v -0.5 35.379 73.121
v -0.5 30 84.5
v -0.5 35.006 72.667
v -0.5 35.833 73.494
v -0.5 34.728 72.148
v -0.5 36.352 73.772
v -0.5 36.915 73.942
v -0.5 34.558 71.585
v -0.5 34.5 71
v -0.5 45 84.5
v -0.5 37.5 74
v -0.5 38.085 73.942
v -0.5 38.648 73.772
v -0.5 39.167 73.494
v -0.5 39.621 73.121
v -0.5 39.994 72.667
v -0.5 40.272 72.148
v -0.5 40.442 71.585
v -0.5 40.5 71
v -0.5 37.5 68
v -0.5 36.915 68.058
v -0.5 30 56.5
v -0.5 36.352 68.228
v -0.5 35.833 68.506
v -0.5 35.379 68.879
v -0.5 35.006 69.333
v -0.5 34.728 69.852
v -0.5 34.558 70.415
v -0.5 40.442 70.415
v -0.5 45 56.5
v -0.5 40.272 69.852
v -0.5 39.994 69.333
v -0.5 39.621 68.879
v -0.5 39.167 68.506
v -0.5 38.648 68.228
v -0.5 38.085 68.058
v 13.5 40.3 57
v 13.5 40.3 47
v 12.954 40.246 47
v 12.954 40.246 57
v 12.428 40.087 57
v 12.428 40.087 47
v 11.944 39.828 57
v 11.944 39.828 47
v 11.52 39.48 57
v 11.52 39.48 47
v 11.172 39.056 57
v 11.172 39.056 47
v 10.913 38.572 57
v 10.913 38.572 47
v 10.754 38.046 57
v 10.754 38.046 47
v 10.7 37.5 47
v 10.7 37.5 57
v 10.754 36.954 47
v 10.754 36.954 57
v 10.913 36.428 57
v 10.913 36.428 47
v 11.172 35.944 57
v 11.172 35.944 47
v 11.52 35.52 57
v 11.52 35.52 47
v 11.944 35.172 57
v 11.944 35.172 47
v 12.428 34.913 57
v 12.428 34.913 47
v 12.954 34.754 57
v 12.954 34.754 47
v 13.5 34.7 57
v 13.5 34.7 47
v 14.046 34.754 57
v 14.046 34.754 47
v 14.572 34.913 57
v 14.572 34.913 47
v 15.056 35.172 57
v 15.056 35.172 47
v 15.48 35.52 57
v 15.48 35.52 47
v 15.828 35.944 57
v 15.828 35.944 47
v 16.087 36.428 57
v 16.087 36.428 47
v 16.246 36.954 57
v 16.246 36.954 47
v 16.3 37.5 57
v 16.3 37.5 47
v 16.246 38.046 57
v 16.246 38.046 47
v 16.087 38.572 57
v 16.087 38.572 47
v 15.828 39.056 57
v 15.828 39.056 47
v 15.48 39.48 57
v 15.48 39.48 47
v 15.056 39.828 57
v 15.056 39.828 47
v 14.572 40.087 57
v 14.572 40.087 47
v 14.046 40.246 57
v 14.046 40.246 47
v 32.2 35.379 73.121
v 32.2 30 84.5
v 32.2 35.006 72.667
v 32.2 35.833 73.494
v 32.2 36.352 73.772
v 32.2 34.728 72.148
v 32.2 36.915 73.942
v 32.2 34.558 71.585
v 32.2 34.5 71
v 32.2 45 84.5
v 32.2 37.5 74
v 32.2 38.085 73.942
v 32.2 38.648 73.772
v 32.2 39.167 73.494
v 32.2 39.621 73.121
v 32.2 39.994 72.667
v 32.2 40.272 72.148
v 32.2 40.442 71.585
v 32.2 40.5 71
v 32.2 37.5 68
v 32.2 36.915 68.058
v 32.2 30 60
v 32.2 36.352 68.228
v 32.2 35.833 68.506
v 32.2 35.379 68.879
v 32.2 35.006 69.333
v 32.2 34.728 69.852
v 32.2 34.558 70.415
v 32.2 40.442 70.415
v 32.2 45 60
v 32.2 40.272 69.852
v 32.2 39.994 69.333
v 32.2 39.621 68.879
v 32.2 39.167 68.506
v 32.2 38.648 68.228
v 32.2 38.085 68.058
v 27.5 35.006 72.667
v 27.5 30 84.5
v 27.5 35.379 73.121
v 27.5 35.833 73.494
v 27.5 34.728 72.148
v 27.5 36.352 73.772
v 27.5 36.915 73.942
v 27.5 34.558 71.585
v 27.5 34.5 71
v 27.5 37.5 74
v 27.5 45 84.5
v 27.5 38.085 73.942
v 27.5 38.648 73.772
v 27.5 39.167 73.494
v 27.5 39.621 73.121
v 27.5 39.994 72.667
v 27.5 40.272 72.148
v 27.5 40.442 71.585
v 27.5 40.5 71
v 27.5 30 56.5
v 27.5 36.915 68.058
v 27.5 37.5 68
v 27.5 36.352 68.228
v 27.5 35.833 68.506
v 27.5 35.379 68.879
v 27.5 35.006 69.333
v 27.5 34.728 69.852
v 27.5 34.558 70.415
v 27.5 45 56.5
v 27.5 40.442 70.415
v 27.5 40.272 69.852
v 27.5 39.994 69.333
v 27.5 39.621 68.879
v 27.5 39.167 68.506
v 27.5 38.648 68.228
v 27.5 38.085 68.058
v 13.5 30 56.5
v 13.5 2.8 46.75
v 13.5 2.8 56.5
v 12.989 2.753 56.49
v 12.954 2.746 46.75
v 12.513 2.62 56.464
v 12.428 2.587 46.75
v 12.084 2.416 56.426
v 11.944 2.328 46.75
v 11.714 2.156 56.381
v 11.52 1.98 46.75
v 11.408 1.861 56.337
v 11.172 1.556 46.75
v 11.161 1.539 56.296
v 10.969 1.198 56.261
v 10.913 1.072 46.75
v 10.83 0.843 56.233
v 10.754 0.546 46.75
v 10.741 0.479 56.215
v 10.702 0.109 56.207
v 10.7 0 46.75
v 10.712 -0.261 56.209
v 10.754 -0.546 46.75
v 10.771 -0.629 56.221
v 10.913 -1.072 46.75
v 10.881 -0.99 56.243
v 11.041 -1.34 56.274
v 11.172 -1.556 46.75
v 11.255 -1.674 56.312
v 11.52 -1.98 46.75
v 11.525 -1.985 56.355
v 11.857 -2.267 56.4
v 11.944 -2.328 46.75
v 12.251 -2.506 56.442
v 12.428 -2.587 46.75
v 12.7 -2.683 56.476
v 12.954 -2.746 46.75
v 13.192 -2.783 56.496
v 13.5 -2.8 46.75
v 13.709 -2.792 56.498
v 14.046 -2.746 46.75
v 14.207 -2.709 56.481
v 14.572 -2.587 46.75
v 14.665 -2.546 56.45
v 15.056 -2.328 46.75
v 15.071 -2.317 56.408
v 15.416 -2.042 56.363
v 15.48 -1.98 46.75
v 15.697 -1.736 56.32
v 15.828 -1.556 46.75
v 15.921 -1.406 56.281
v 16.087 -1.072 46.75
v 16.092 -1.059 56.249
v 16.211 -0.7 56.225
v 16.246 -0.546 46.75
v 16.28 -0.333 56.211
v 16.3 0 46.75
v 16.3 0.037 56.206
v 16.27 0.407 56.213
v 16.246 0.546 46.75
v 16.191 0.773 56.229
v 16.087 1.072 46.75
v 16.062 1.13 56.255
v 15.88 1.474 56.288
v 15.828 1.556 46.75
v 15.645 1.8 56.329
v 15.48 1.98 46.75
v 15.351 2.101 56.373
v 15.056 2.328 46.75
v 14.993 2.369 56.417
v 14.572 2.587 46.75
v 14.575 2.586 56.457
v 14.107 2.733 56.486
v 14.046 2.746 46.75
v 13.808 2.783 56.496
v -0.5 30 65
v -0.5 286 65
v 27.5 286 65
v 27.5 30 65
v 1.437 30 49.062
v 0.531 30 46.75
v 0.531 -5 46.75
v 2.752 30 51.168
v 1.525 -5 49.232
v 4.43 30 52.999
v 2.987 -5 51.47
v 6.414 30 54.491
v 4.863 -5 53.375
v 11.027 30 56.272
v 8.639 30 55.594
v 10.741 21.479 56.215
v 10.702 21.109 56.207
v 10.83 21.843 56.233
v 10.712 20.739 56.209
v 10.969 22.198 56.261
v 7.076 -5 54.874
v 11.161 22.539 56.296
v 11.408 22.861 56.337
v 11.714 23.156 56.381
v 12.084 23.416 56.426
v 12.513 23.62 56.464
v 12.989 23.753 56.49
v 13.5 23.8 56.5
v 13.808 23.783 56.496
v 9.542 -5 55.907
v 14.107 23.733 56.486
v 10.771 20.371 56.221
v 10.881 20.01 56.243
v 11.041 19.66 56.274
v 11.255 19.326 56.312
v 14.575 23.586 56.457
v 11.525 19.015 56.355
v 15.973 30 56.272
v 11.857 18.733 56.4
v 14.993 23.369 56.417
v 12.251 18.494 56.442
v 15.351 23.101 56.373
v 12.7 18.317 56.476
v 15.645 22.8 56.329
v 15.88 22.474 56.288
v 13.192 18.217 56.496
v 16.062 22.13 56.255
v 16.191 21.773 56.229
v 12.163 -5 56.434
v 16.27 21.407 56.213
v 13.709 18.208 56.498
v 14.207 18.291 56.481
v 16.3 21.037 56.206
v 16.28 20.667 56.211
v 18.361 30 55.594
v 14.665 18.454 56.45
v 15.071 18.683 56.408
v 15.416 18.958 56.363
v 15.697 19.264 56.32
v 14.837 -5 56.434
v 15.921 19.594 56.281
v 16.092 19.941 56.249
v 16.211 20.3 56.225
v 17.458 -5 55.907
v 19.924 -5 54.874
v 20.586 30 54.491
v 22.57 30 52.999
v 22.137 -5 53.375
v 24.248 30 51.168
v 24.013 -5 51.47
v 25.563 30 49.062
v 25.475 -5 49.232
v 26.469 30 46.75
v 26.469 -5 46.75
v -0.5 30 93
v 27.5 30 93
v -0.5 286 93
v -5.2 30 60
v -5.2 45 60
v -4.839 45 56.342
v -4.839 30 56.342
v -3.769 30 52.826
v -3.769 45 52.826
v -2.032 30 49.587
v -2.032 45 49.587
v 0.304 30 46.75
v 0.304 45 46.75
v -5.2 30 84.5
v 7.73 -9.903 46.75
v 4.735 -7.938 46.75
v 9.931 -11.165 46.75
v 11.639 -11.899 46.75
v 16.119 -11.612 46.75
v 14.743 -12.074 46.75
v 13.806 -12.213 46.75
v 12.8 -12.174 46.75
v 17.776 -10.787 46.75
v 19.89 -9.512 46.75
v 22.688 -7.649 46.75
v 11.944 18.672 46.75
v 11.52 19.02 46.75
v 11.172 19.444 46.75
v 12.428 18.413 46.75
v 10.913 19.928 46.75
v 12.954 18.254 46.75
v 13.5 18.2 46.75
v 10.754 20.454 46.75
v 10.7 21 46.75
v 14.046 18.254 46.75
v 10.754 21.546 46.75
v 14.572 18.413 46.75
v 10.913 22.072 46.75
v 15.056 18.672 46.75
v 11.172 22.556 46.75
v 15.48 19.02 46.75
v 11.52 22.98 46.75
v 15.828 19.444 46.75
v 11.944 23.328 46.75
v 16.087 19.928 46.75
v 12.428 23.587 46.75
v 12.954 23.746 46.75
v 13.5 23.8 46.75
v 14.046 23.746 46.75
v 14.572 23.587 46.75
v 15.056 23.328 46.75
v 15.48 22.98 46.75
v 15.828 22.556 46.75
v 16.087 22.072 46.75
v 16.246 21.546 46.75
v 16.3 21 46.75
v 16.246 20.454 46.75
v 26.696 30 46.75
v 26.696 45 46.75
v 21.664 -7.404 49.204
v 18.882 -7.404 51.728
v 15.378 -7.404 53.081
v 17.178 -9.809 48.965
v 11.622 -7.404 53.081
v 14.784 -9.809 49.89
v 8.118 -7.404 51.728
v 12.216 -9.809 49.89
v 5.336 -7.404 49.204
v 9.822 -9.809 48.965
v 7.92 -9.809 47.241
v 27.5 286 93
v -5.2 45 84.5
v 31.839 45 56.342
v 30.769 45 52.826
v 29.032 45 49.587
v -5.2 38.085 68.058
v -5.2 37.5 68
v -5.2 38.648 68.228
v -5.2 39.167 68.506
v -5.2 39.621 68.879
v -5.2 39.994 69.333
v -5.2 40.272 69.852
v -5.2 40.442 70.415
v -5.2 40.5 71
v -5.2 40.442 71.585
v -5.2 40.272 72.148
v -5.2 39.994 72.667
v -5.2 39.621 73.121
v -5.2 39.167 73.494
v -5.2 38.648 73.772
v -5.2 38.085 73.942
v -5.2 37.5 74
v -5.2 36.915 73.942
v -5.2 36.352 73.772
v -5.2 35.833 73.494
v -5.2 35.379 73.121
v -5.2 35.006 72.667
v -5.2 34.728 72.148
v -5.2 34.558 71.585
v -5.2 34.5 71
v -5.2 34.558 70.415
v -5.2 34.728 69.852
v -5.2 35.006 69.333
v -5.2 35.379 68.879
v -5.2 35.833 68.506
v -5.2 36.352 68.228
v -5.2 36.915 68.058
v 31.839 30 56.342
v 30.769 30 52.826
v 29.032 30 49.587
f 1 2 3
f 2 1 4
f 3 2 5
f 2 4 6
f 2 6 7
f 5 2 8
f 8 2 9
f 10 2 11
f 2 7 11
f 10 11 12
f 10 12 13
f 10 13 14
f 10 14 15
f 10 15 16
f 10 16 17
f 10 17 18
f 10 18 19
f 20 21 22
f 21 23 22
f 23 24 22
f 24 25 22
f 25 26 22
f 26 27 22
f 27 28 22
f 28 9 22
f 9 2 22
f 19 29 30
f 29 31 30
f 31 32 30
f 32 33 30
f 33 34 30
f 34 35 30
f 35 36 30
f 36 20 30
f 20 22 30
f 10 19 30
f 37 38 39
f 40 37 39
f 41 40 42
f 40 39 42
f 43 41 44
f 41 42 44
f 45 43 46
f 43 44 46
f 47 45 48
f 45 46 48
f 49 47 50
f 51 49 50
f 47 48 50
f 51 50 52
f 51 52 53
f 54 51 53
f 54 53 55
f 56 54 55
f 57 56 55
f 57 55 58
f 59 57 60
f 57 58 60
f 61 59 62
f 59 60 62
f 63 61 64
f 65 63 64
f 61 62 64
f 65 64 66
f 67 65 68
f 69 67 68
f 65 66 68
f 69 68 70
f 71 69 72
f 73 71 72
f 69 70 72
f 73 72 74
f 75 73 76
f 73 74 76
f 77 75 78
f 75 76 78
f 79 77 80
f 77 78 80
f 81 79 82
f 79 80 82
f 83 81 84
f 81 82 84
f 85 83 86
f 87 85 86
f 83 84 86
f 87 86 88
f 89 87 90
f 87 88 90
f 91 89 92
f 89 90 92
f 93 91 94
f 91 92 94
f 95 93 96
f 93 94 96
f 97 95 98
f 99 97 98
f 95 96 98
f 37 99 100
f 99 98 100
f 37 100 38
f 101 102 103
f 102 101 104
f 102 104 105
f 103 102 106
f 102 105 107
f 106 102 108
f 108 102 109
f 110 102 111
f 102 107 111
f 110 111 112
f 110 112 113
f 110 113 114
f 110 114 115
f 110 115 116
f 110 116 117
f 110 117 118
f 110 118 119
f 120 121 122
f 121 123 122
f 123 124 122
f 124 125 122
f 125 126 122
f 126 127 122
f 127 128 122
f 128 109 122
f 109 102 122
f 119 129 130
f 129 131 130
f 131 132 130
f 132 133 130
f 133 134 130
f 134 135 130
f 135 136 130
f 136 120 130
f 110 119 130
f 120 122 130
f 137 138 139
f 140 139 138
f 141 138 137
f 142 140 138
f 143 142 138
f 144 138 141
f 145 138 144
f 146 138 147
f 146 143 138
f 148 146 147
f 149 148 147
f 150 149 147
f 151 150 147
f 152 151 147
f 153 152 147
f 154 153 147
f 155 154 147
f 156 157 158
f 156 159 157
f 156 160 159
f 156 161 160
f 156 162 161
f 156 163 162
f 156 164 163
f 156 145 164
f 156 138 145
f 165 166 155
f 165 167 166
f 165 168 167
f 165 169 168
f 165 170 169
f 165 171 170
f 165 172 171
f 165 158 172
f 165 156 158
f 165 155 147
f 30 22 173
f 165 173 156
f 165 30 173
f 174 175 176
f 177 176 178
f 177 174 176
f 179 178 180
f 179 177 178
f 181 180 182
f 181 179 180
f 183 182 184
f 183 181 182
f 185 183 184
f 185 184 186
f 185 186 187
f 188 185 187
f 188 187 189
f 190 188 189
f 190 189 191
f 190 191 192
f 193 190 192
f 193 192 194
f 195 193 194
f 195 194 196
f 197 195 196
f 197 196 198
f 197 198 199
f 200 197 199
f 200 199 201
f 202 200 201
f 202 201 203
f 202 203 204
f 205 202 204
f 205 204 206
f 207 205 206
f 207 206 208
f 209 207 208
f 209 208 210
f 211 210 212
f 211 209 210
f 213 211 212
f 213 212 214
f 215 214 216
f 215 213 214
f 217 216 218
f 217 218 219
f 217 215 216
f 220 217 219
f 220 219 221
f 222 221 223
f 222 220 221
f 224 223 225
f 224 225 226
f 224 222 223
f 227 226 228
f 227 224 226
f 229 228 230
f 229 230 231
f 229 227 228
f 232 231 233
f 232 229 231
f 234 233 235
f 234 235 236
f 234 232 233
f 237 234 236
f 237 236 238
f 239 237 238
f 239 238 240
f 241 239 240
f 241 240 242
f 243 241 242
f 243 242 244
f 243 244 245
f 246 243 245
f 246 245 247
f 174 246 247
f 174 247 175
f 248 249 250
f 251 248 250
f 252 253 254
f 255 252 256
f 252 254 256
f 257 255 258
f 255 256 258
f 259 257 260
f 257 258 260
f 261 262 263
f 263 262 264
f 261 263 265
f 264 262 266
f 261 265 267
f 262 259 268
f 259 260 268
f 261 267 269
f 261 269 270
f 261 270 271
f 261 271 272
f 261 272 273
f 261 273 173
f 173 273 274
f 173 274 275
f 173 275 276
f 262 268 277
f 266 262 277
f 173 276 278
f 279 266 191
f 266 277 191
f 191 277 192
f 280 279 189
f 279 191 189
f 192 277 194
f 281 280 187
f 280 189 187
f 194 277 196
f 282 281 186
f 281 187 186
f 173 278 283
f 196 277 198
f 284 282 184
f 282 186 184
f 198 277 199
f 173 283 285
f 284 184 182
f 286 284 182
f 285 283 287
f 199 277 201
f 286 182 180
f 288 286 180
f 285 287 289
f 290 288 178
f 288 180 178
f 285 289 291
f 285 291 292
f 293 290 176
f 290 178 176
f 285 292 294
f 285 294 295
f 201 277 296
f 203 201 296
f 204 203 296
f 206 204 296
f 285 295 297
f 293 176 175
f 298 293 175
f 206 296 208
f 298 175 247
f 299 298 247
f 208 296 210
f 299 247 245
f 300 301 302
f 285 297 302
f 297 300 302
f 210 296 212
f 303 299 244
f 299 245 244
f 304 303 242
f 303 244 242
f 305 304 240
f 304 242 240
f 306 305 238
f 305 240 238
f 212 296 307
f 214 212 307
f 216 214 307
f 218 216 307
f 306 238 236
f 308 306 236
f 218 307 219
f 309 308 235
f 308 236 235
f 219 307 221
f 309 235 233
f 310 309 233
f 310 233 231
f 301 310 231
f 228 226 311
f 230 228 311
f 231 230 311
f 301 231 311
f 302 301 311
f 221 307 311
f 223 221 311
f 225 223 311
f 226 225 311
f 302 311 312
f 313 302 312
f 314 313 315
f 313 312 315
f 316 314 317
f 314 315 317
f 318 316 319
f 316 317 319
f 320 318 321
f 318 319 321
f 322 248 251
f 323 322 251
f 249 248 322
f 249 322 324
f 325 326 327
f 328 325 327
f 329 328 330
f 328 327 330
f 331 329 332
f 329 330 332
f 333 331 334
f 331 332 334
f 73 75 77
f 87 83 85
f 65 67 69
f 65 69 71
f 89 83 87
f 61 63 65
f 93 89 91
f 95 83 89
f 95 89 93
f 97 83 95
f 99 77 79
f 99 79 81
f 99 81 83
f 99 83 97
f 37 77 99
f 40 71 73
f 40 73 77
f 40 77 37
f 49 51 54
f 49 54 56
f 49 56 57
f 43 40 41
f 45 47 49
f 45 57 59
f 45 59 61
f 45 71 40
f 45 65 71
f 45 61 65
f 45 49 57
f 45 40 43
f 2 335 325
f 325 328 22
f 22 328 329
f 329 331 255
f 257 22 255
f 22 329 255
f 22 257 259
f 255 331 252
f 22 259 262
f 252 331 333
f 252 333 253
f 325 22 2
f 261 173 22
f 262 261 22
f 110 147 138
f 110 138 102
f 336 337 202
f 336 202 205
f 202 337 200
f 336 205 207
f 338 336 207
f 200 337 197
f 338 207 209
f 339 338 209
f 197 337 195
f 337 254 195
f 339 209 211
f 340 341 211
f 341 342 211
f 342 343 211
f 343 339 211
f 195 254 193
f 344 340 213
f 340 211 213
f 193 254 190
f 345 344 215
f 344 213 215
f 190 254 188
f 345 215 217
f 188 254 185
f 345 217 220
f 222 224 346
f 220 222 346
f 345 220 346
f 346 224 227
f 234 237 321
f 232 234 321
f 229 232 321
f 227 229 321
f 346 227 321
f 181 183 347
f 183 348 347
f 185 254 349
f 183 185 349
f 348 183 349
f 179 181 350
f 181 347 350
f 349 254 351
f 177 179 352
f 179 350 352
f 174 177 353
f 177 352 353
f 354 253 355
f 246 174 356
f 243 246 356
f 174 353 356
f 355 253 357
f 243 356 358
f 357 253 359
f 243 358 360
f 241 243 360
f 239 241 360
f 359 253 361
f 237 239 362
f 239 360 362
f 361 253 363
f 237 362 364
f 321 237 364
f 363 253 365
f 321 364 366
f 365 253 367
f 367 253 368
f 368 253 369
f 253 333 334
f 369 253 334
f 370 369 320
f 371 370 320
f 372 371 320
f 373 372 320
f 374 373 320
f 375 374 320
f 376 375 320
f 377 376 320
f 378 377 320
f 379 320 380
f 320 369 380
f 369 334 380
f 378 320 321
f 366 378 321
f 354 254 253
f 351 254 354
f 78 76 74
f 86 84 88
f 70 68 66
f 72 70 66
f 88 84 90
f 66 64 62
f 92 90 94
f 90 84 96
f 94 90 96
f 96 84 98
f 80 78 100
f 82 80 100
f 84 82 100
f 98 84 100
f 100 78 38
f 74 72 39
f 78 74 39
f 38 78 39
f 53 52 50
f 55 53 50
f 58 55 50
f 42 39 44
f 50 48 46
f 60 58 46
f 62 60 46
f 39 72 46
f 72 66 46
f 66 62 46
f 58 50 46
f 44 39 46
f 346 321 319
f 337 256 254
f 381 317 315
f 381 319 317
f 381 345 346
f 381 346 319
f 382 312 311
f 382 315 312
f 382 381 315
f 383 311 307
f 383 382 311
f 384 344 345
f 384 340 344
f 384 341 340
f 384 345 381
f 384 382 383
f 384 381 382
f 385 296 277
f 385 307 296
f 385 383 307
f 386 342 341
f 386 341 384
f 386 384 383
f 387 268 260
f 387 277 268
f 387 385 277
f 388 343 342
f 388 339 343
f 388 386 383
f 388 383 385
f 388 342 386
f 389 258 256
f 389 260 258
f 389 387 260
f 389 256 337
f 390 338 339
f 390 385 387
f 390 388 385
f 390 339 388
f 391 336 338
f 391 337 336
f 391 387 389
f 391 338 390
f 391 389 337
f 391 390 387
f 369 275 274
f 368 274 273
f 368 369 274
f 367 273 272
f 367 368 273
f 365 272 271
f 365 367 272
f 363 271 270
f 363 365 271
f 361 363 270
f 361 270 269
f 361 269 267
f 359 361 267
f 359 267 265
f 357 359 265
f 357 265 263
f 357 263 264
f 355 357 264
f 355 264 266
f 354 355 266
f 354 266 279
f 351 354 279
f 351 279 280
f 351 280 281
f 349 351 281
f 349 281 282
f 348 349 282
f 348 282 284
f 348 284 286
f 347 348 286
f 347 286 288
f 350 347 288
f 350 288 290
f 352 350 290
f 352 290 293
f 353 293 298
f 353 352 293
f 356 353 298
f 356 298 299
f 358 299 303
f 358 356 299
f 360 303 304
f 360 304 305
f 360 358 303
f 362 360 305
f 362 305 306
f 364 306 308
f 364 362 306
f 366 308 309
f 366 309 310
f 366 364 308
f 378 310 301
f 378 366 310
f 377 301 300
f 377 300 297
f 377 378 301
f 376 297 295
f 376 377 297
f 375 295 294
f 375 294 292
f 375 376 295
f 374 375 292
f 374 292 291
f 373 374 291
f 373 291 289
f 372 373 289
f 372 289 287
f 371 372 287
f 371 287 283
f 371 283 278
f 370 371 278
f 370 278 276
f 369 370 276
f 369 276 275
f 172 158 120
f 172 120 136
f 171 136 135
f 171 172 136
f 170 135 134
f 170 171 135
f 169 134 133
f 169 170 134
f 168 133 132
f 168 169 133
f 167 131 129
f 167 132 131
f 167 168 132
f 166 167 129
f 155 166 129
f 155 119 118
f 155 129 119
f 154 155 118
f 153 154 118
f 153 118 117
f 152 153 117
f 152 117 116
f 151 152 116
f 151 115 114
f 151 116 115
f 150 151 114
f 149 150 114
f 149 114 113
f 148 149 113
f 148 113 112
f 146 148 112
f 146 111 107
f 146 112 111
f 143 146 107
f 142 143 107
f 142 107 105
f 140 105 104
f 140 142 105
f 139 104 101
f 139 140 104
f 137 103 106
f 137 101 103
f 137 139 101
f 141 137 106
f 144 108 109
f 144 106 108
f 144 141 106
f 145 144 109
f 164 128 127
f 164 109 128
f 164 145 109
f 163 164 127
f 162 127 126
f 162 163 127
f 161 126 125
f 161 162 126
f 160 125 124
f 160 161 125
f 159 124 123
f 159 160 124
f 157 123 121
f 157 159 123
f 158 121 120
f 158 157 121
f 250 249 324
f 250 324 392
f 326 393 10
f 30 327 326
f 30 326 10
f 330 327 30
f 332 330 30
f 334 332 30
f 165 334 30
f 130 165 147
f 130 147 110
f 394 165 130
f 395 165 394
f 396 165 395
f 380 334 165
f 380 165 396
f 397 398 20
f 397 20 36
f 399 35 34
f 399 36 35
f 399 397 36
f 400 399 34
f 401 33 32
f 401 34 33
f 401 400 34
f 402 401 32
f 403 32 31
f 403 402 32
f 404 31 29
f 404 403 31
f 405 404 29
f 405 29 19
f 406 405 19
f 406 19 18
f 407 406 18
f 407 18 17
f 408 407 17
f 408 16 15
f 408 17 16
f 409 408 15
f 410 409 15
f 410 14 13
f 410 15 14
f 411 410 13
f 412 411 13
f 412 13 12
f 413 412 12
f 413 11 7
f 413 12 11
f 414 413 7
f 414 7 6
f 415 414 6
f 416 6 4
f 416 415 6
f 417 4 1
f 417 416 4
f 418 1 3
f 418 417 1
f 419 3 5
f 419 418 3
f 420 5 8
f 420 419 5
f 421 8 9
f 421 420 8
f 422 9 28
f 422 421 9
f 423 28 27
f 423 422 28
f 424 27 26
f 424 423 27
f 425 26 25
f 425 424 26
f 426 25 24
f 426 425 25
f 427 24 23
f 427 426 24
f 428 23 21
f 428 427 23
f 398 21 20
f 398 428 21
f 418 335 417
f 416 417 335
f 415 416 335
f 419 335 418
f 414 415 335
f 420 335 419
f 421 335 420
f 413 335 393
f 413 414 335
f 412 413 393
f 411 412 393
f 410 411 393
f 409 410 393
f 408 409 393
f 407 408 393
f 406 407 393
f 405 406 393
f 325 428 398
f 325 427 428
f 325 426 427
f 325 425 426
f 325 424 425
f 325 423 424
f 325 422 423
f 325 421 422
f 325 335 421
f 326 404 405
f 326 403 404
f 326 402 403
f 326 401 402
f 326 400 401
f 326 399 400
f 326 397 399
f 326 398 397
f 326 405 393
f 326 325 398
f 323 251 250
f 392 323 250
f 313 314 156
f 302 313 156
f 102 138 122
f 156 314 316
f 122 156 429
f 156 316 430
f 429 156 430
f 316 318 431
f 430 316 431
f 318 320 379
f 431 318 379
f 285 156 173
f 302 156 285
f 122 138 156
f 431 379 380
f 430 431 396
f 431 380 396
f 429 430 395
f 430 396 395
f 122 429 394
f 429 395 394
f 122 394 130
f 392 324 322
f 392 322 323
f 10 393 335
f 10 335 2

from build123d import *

# Parameters (mm, degrees)
BOX_W             = 28
BOX_H             = 256
BOX_DEPTH         = 28
CYLINDER012_R     = 2.8
CYLINDER012_DEPTH = 10
CYLINDER015_R     = 2.8
CYLINDER015_DEPTH = 12
CYLINDER011_R     = 2.8
CYLINDER011_DEPTH = 12
CYLINDER009_R     = 3
CYLINDER009_DEPTH = 100
BOX018_W          = 28
BOX018_H          = 254
BOX018_DEPTH      = 28
BOX015_W          = 37.4
BOX015_H          = 15
BOX015_DEPTH      = 37.75
BOX016_W          = 27
BOX016_H          = 75
BOX016_DEPTH      = 20
CONE_ANGLE        = 180
CYLINDER_R        = 13.5
CYLINDER_DEPTH    = 50
CYLINDER016_R     = 18.7
CYLINDER016_DEPTH = 63
BOX019_W          = 40
BOX019_H          = 18
BOX019_DEPTH      = 29


with BuildPart() as tslotframecut:
    # Box → Box (new body)
    with BuildSketch(Plane(origin=(-0.5, 30, 65), x_dir=(1, 0, 0), z_dir=(0, 0, 1))):
        with Locations((14, 128)):
            Rectangle(BOX_W, BOX_H)
    extrude(amount=BOX_DEPTH)


with BuildPart() as cylinder012:
    # Cylinder012 → Cylinder012 (new body)
    with BuildSketch(Plane(origin=(13.5, 37.5, 47), x_dir=(0, 1, 0), z_dir=(0, 0, 1))):
        Circle(CYLINDER012_R)
    extrude(amount=CYLINDER012_DEPTH)


with BuildPart() as cylinder015:
    # Cylinder015 → Cylinder015 (new body)
    with BuildSketch(Plane(origin=(13.5, 21, 45), x_dir=(0, 1, 0), z_dir=(0, 0, 1))):
        Circle(CYLINDER015_R)
    extrude(amount=CYLINDER015_DEPTH)


with BuildPart() as heatsetcuts:
    # Cylinder011 → Cylinder011 (new body)
    with BuildSketch(Plane(origin=(13.5, 0, 45), x_dir=(0, 1, 0), z_dir=(0, 0, 1))):
        Circle(CYLINDER011_R)
    extrude(amount=CYLINDER011_DEPTH)

    # Fusion001: union Cylinder015
    add(cylinder015.part)


with BuildPart() as m5cut:
    # Cylinder009 → Cylinder009 (new body)
    with BuildSketch(Plane(origin=(-56.4, 37.5, 71), x_dir=(0, 0, -1), z_dir=(1, 0, 0))):
        Circle(CYLINDER009_R)
    extrude(amount=CYLINDER009_DEPTH)


with BuildPart() as tslotframecut001:
    # Box018 → Box018 (new body)
    with BuildSketch(Plane(origin=(-0.5, 0, 56.5), x_dir=(1, 0, 0), z_dir=(0, 0, 1))):
        with Locations((14, 127)):
            Rectangle(BOX018_W, BOX018_H)
    extrude(amount=BOX018_DEPTH)


with BuildPart() as cut010:
    # Box015 → Box015 (new body)
    with BuildSketch(Plane(origin=(-5.2, 30, 46.75), x_dir=(1, 0, 0), z_dir=(0, 0, 1))):
        with Locations((18.7, 7.5)):
            Rectangle(BOX015_W, BOX015_H)
    extrude(amount=BOX015_DEPTH)

    # Cut009: cut TSlotFrameCut001
    add(tslotframecut001.part, mode=Mode.SUBTRACT)

    # Cut010: cut m5Cut
    add(m5cut.part, mode=Mode.SUBTRACT)


with BuildPart() as shell_holder002:
    # Box016 → Box016 (new body)
    with BuildSketch(Plane(origin=(0, -20.5, 26.75), x_dir=(1, 0, 0), z_dir=(0, 0, 1))):
        with Locations((13.5, 37.5)):
            Rectangle(BOX016_W, BOX016_H)
    extrude(amount=BOX016_DEPTH)


with BuildPart() as cone:
    # Cone → Cone (revolve)
    with BuildSketch(Plane(origin=(13.5, -5, 43), x_dir=(1, 0, 0), z_dir=(0, 0, -1))):
        Polygon((0, 0), (13.5, 0), (0, 10), align=None)
    revolve(axis=Axis((13.5, -5, 43), (0, -1, 0)), revolution_arc=CONE_ANGLE)


with BuildPart() as cut011:
    # Cylinder → Cylinder (new body)
    with BuildSketch(Plane(origin=(13.5, -5, 43), x_dir=(1, 0, 0), z_dir=(0, 1, 0))):
        Circle(CYLINDER_R)
    extrude(amount=CYLINDER_DEPTH)

    # Fusion: union Cone
    add(cone.part)

    # Cut: cut Shell_Holder002
    add(shell_holder002.part, mode=Mode.SUBTRACT)

    # Fusion002: union Cut010
    add(cut010.part)

    # Cut011: cut heatSetCuts
    add(heatsetcuts.part, mode=Mode.SUBTRACT)


with BuildPart() as reshapes:
    # Cylinder016 → Cylinder016 (new body)
    with BuildSketch(Plane(origin=(13.5, 45, 60), x_dir=(1, 0, 0), z_dir=(0, -1, 0))):
        Circle(CYLINDER016_R)
    extrude(amount=CYLINDER016_DEPTH)


with BuildPart() as common:
    # Box019 → Box019 (new body)
    with BuildSketch(Plane(origin=(-6.5, 30, 60), x_dir=(1, 0, 0), z_dir=(0, 0, 1))):
        with Locations((20, 9)):
            Rectangle(BOX019_W, BOX019_H)
    extrude(amount=BOX019_DEPTH)

    # Fusion003: union reshapes
    add(reshapes.part)

    # Common: intersect Cut011
    add(cut011.part, mode=Mode.INTERSECT)


solid = Compound([tslotframecut.part, cylinder012.part, common.part])
